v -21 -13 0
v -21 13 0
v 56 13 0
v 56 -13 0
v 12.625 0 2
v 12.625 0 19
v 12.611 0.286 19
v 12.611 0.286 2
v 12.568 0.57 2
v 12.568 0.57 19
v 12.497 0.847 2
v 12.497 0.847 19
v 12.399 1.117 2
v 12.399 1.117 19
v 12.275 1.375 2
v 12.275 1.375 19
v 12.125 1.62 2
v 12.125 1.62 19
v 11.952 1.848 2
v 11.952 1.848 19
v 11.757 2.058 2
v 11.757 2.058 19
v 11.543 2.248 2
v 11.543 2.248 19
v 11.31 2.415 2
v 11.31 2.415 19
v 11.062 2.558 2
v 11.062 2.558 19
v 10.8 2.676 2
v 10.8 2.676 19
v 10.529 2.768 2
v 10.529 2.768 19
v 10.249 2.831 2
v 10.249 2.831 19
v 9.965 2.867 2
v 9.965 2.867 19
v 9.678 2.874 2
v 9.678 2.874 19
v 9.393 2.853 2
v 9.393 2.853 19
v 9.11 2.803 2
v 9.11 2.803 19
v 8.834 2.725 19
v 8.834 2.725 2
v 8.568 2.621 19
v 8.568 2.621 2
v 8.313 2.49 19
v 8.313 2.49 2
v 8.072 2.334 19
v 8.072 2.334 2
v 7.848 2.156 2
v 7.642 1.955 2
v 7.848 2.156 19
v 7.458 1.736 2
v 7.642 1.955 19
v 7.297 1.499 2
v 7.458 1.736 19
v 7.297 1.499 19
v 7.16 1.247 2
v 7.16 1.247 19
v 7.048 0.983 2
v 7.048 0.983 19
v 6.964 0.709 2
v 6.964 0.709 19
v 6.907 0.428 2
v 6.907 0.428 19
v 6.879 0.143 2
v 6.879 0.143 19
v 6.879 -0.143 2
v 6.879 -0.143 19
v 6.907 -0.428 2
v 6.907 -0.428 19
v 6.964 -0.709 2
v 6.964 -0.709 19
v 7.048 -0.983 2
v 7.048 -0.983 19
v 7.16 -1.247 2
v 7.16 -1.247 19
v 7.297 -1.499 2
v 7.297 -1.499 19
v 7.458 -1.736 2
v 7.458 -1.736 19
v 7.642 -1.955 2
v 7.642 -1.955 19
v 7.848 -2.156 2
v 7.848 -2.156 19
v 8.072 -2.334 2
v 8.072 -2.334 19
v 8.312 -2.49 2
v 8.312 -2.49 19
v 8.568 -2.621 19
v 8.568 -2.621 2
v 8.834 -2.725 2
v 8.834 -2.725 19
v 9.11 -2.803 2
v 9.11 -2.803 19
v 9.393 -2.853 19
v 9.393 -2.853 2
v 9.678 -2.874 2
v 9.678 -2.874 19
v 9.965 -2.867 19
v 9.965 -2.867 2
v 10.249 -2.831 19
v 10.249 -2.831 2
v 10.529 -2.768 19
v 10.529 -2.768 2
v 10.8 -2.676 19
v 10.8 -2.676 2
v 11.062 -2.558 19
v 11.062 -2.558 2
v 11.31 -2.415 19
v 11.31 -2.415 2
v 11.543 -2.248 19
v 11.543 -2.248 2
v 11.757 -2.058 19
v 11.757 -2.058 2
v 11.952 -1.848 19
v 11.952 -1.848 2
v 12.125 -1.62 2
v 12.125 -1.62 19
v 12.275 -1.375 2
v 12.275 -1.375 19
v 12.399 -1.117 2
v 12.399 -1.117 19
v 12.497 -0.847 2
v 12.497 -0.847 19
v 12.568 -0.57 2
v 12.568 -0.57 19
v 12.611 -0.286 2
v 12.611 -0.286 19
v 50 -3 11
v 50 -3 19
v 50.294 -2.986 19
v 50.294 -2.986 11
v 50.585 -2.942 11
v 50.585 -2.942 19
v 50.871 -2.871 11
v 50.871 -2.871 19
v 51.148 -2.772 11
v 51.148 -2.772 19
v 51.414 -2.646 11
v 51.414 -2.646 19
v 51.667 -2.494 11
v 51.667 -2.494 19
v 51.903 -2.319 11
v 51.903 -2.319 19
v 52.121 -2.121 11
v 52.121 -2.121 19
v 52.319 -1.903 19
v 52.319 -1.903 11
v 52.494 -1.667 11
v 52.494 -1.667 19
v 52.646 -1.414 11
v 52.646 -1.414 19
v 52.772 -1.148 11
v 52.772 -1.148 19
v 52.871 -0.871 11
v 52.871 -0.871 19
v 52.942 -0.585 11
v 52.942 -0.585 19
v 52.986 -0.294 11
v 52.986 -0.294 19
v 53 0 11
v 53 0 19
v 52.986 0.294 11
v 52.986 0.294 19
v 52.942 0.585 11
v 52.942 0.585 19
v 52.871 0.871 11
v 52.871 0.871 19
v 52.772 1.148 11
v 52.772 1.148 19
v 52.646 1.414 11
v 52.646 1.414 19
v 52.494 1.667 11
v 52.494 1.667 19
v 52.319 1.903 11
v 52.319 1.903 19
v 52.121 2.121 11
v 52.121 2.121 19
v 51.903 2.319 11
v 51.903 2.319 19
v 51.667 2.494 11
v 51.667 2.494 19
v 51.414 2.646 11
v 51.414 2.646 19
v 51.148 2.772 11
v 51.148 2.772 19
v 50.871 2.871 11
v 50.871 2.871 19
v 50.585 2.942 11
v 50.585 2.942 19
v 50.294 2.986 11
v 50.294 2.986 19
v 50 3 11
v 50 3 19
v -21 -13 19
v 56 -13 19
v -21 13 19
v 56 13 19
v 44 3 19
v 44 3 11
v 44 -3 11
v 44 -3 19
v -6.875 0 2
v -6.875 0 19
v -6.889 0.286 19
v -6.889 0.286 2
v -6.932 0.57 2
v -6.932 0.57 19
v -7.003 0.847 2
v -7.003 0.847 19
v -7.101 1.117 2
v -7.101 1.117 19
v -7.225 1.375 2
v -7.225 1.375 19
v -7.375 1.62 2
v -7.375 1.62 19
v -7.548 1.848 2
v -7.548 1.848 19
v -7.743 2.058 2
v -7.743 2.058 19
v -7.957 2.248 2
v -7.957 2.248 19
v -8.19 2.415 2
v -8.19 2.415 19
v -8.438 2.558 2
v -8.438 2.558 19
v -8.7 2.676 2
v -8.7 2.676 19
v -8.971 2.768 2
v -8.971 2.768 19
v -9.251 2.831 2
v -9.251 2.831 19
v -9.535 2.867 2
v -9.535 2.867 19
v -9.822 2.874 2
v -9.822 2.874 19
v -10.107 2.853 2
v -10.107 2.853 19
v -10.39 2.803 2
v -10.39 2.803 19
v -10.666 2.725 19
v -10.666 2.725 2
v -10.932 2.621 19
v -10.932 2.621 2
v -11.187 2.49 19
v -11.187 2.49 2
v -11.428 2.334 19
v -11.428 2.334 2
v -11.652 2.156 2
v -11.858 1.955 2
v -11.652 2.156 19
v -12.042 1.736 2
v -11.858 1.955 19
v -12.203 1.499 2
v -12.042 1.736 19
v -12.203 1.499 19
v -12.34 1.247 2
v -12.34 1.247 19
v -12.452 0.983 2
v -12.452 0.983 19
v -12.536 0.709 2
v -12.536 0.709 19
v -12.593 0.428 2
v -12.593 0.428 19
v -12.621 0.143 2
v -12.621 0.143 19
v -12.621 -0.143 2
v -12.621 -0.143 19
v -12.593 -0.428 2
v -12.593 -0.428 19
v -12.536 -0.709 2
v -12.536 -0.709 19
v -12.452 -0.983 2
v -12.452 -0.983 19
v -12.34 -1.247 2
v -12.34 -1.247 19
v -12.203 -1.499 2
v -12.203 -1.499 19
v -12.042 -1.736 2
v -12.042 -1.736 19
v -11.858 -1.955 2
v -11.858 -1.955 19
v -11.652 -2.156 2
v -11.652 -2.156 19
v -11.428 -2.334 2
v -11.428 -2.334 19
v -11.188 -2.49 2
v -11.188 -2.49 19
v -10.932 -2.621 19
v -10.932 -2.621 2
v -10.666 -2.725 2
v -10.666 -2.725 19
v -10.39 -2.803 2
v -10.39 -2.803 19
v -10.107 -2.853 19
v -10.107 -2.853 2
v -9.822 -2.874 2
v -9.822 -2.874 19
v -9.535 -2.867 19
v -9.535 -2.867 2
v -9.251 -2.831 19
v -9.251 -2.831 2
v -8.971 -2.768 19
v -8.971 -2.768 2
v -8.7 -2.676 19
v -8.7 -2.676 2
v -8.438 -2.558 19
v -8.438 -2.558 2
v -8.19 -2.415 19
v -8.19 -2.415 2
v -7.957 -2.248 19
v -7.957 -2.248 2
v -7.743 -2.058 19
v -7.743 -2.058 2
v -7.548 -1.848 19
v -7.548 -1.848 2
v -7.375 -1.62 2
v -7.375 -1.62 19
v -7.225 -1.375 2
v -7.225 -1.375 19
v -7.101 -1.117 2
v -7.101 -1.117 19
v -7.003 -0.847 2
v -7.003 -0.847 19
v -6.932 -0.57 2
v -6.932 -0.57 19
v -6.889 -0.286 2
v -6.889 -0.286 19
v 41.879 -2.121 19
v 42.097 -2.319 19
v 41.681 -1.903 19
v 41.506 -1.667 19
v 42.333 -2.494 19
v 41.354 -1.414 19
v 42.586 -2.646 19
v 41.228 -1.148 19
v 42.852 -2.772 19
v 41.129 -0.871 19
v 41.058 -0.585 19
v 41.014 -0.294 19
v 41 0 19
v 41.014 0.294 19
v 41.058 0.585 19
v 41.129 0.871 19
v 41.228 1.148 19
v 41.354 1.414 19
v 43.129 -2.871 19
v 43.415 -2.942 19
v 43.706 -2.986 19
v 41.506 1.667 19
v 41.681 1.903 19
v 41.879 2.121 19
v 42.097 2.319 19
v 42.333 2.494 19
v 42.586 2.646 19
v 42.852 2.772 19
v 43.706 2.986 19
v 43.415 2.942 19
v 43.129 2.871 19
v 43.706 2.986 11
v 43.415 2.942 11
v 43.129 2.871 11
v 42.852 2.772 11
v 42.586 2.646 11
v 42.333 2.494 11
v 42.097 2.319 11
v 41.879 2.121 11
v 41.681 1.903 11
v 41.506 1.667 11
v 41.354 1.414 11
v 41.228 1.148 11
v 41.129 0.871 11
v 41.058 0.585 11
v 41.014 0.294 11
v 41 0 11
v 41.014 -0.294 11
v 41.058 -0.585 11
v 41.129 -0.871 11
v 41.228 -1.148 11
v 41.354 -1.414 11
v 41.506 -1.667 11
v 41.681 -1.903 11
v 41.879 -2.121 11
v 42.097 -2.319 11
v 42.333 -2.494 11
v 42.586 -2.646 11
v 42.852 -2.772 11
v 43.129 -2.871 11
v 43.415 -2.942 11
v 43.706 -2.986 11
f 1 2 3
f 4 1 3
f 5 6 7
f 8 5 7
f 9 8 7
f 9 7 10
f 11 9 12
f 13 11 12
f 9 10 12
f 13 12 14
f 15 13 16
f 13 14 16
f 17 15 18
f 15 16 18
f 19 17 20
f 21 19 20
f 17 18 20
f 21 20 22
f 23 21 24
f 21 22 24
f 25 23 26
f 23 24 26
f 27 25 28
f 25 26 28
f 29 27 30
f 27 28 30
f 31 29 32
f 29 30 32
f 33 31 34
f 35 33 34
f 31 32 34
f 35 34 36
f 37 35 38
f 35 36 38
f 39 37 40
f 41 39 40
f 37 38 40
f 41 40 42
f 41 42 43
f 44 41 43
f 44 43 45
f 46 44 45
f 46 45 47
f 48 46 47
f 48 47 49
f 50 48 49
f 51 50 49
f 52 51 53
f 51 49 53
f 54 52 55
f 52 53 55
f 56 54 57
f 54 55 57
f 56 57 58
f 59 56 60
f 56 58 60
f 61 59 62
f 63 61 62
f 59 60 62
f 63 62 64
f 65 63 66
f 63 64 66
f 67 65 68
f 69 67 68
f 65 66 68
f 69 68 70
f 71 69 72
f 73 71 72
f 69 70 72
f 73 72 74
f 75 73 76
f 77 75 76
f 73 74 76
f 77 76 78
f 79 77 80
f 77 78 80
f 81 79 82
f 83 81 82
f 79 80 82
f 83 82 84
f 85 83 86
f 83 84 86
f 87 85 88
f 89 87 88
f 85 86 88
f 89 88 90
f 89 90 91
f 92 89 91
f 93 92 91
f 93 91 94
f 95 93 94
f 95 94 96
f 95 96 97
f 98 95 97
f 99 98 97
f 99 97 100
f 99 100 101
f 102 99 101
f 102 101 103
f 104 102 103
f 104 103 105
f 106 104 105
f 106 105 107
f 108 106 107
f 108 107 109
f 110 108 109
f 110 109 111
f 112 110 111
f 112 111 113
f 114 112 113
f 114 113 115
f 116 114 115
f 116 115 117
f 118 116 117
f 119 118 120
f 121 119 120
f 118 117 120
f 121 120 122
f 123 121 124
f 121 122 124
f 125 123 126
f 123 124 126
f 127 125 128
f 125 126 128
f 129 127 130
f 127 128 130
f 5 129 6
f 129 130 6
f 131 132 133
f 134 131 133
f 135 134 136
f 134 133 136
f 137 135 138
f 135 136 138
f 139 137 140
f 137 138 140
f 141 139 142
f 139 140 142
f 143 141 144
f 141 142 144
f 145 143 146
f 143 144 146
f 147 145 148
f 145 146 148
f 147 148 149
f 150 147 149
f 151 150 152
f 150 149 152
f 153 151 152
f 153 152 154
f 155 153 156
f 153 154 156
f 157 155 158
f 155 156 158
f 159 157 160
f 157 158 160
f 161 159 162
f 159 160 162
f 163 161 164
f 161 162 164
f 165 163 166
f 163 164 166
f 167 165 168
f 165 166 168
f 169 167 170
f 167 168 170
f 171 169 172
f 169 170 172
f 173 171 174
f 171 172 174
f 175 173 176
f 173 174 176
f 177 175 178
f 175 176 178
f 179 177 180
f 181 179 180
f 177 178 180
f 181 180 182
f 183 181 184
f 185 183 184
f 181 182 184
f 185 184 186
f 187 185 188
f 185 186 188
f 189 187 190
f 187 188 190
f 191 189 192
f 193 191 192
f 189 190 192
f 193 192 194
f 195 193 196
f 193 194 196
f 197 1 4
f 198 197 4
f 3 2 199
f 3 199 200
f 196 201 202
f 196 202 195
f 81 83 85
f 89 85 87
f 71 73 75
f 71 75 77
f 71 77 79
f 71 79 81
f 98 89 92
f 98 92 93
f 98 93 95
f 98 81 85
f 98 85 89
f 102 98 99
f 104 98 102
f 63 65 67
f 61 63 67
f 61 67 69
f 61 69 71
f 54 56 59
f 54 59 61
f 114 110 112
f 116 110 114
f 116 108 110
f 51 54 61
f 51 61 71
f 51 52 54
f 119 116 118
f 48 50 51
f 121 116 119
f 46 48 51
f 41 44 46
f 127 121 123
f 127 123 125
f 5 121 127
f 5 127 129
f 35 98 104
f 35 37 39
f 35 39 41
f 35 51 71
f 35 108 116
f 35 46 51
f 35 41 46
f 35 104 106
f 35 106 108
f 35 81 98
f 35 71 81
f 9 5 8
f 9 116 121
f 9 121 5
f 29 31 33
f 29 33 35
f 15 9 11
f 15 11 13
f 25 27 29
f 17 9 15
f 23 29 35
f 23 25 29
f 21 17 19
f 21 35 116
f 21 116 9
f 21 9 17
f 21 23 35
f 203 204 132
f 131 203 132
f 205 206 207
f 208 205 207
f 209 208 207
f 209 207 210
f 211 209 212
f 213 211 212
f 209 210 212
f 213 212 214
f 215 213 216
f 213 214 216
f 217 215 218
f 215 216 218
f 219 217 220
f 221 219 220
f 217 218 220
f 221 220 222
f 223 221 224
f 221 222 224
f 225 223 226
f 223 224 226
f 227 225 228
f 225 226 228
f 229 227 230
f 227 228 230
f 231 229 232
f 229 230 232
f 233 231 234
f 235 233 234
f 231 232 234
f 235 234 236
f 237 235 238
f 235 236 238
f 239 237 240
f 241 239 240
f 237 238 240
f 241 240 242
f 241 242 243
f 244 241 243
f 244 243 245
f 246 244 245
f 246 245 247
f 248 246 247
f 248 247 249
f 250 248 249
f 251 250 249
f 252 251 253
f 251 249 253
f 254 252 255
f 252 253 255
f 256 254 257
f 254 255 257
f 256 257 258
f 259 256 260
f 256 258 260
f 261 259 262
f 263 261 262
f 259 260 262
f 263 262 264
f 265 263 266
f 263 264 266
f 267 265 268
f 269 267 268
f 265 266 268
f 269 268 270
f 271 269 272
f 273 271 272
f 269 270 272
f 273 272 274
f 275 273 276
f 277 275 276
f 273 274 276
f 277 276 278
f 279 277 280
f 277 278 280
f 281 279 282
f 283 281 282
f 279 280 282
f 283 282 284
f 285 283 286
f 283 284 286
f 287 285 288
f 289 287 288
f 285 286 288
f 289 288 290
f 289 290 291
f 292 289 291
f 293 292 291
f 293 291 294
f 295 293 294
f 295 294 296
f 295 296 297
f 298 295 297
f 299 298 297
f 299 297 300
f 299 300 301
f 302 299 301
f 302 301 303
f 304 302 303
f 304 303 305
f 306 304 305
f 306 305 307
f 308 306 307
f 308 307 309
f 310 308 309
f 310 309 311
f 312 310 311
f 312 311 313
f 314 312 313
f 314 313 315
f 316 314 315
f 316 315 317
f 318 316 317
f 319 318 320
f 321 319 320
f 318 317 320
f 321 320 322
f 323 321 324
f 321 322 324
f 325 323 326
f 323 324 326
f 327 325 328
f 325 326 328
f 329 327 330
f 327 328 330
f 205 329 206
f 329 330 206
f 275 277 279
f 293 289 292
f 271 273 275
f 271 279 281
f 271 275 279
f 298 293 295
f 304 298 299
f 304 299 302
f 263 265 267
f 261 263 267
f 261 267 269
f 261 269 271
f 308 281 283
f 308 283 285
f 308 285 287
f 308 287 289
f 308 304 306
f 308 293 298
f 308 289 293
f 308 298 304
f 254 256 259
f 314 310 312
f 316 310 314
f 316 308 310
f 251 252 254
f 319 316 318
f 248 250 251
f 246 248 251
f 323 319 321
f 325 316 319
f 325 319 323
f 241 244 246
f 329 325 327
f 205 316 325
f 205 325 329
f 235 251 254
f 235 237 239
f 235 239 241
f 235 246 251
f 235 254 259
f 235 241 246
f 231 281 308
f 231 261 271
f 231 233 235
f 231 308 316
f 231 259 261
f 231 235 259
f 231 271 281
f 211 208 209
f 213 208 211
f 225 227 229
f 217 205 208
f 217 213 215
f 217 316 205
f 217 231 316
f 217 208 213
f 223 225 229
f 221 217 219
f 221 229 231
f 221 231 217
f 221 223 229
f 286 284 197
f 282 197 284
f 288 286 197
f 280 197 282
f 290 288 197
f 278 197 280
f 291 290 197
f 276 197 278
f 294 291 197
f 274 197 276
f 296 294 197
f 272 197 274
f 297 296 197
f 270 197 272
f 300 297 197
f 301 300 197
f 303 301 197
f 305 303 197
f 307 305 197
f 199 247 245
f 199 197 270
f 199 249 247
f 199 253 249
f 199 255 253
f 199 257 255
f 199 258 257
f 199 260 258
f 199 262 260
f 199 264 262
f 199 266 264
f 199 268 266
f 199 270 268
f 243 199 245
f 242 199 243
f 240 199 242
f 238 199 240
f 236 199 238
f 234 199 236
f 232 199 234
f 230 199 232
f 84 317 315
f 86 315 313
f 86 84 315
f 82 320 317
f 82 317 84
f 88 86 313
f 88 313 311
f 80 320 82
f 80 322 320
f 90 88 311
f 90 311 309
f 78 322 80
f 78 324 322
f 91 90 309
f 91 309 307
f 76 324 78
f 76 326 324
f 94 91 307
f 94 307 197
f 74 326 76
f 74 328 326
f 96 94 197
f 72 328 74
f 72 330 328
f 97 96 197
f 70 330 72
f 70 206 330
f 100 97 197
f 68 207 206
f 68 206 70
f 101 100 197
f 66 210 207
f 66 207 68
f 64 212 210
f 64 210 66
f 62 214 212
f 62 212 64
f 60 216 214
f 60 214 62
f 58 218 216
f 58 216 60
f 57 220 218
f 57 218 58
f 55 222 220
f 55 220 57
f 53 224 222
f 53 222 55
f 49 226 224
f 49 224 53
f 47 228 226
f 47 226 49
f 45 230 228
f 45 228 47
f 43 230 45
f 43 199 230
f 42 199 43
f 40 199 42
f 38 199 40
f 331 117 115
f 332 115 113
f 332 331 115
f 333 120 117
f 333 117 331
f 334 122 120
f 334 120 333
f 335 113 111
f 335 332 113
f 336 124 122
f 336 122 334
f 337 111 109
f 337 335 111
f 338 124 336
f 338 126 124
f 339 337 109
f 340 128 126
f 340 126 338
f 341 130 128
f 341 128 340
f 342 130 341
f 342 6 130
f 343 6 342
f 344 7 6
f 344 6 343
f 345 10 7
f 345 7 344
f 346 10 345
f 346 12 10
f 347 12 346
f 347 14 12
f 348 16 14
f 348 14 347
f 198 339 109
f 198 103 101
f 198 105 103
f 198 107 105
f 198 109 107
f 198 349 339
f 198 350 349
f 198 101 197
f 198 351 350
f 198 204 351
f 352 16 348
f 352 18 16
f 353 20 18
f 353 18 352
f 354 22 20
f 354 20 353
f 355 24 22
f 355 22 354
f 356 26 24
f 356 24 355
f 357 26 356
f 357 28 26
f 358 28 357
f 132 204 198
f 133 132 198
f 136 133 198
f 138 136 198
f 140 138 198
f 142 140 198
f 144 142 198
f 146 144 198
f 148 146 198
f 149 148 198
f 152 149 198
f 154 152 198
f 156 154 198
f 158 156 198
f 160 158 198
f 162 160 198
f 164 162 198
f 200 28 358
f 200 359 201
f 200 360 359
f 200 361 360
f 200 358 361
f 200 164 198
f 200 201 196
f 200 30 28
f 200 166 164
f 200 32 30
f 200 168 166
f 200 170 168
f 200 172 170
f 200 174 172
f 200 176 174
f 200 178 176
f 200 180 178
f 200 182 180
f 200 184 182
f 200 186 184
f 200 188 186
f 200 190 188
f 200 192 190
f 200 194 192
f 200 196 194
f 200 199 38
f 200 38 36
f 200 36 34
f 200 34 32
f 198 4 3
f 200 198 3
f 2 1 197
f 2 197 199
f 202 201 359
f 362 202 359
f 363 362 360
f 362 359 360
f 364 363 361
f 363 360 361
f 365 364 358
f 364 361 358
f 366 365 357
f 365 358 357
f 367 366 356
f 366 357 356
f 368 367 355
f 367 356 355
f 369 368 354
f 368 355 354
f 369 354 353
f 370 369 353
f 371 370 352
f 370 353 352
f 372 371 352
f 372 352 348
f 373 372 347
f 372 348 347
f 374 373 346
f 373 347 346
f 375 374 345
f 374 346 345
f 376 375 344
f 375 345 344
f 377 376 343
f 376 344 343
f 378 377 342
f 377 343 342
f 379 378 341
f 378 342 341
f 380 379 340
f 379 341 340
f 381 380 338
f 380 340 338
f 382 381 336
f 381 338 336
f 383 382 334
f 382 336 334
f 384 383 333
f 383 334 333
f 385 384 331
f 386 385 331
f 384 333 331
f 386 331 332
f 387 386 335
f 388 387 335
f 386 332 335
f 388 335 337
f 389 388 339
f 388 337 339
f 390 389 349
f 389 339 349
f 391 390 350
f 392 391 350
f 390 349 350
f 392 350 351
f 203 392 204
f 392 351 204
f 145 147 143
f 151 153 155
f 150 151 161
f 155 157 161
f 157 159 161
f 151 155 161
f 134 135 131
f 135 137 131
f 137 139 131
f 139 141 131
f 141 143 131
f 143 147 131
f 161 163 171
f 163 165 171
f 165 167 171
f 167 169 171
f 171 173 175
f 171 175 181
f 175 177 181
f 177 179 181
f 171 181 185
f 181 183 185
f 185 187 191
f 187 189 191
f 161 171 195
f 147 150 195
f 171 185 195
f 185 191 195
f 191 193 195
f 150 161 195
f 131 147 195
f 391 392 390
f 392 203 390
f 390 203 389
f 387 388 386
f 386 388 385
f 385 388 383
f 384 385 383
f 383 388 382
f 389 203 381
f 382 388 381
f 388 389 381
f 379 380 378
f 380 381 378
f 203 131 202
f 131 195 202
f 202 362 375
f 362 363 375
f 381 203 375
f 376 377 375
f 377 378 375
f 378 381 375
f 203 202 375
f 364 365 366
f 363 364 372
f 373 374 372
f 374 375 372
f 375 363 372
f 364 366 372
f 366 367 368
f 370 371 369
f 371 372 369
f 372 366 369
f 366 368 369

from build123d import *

# Parameters (mm, degrees)
SKETCH_W        = 77
SKETCH_H        = 26
PAD_DEPTH       = 19
SKETCH001_R     = 2.875
POCKET_DEPTH    = 17
POCKET001_DEPTH = 8


with BuildPart() as part:
    # Sketch → Pad (new body)
    with BuildSketch(Plane.XY):
        with Locations((17.5, 0)):
            Rectangle(SKETCH_W, SKETCH_H)
    extrude(amount=PAD_DEPTH)

    # Sketch001 (on Face6 of Pad) → Pocket (cut)
    with BuildSketch(Plane.XY.offset(19)):
        with Locations((-9.75, 0)):
            Circle(SKETCH001_R)
        with Locations((9.75, 0)):
            Circle(SKETCH001_R)
    extrude(amount=-POCKET_DEPTH, mode=Mode.SUBTRACT)

    # Sketch002 (on Face5 of Pocket) → Pocket001 (cut)
    with BuildSketch(Plane.XY.offset(19)):
        with BuildLine():
            Line((44, 3), (50, 3))
            ThreePointArc((50, -3), (53, 0), (50, 3))
            Line((44, -3), (50, -3))
            ThreePointArc((44, 3), (41, 0), (44, -3))
        make_face()
    extrude(amount=-POCKET001_DEPTH, mode=Mode.SUBTRACT)


solid = part.part
